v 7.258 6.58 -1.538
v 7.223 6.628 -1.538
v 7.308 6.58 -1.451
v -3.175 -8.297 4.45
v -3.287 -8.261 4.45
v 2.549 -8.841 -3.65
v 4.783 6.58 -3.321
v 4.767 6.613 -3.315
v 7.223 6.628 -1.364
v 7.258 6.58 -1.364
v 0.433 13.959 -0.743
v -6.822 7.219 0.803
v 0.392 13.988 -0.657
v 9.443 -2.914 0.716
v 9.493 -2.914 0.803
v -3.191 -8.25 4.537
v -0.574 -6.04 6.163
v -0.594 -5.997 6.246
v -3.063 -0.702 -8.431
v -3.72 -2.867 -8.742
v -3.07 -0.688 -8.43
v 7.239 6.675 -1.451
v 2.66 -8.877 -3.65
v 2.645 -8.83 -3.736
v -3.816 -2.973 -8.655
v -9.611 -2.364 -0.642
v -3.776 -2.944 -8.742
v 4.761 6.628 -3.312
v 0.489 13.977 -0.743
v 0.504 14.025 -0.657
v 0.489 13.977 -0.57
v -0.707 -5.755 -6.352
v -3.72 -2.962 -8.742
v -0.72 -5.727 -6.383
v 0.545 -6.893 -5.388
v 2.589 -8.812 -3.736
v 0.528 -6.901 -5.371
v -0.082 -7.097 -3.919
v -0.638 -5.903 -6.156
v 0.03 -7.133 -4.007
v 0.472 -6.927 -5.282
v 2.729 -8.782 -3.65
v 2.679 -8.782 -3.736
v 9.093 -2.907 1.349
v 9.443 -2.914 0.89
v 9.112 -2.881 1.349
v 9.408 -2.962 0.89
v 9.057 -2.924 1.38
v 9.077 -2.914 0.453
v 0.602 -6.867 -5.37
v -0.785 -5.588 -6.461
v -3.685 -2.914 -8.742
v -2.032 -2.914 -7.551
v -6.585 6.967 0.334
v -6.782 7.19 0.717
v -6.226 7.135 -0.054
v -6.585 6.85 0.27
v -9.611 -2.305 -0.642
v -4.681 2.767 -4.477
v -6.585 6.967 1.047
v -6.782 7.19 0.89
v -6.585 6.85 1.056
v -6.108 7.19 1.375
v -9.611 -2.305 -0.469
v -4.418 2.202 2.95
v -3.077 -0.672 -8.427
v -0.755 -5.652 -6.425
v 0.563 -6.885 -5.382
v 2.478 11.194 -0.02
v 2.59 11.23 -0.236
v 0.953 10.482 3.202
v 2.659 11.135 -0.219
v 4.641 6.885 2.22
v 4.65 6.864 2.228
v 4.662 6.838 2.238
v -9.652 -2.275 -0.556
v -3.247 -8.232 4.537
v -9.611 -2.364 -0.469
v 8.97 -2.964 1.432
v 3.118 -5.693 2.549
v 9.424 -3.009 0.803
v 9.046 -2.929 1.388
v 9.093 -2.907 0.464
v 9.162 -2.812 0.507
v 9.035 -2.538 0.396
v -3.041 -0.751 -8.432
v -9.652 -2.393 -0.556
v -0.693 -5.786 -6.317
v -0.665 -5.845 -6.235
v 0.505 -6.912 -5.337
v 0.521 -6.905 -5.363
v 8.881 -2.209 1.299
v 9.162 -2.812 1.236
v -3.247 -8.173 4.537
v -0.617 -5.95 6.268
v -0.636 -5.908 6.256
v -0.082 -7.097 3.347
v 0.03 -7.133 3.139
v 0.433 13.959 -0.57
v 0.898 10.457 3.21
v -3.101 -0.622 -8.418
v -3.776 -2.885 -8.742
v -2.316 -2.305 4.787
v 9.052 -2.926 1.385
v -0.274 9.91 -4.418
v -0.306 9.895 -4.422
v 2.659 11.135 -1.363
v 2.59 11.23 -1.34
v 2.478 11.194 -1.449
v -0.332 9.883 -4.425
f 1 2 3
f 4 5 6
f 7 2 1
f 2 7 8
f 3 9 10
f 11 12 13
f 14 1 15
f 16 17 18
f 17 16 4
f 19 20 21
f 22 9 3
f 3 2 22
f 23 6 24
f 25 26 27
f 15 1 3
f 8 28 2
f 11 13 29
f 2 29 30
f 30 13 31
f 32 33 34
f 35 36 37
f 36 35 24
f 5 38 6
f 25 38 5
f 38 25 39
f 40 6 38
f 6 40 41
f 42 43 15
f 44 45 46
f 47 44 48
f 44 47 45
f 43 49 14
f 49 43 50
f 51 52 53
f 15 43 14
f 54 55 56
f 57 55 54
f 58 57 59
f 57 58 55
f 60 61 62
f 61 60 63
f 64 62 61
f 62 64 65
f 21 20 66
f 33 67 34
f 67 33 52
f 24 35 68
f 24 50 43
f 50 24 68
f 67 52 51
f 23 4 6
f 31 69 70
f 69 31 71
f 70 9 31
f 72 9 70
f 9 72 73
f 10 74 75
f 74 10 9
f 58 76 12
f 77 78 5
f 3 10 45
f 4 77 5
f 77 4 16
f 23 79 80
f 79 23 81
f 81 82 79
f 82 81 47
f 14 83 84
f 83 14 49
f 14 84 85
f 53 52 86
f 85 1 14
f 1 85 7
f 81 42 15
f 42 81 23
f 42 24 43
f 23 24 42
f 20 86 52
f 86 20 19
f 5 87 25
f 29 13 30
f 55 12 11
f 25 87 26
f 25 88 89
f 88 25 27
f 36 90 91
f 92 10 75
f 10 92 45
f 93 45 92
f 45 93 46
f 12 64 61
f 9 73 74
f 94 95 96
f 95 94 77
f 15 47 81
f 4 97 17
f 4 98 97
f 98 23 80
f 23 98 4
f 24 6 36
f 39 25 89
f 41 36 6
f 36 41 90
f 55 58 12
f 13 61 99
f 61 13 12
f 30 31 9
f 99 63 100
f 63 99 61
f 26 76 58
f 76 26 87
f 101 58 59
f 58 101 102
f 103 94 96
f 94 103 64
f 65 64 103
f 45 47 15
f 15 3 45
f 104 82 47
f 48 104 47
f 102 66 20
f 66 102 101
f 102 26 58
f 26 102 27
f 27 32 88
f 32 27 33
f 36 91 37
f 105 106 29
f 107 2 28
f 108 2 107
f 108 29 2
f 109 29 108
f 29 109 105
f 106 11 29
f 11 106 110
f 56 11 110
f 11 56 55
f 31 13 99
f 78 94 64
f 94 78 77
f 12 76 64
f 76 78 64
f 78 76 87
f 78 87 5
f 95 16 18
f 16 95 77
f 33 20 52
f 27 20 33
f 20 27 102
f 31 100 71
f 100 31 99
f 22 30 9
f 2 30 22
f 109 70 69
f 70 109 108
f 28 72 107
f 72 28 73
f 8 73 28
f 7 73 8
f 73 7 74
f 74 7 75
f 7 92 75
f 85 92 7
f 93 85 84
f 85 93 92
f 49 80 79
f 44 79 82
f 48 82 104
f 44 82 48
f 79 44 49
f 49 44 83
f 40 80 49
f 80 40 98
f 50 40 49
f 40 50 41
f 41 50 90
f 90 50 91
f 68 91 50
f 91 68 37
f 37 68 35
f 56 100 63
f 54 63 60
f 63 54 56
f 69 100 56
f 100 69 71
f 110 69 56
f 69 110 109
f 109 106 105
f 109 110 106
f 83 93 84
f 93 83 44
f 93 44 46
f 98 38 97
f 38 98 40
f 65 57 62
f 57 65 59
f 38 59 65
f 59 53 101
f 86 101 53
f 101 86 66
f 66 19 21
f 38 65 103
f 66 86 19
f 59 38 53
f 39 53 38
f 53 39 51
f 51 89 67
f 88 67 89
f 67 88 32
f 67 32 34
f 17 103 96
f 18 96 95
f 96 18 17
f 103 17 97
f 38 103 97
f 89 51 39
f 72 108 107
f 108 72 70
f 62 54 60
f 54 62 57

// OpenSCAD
// Auto-generated OpenSCAD file

    inner_points = 10*[[0.2558824559881848, 1.1134809877530691, 0.5000000000030929], [-0.6504210229442514, 0.6908534873760076, 0.50000000000051], [0.9062393061228075, -0.28117666064270774, -9.353628982466944e-13], [-6.41728096287264e-05, -0.7038041610197694, -3.518157987159043e-12], [0.25588245598941933, 1.1134809877565333, -0.49999999999690703], [-0.6504210229430168, 0.6908534873794716, -0.49999999999948996], [0.6578250941889378, 0.2515351583779428, -0.809016994374344], [-0.24847838474349848, -0.17109234199911882, -0.809016994376927], [0.6578250941869402, 0.251535158372338, 0.8090169943755507], [-0.248478384745496, -0.17109234200472362, 0.8090169943729678], [-0.08864545939497245, 0.6692288945346313, -1.3270070091503023]];

    outer_points = 10*[[0.939271150352653, -0.2914253703744584, 0.0802979287858217], [0.35569526368517285, -0.23342057046774728, 0.8902822667134429], [-0.3735213820712076, -0.2914253703744584, -0.865540194553496], [-0.9570972687386876, -0.23342057046774728, -0.05555585662587481], [0.7207978378522963, 0.6580298560378001, -0.14509990785767551], [0.13722195118481623, 0.7160346559445111, 0.6648844300699457], [-0.09055256736269784, 0.6580298560378001, -0.729660015936789], [-0.674128454030178, 0.7160346559445111, 0.08032432199083217], [0.2629446778976564, -0.8782209710934609, -0.36495865525691407], [-0.3206312087698237, -0.8202161711867498, 0.44502568267070713], [0.04731076808846265, 1.3929484844445685, -0.06566580635435994]];

    // Convex hull for inner set (I)
    module inner_hull() {
        hull() {
            for (p = inner_points) {
                translate(p) sphere(r=0.1);
            }
        }
    }

    // Convex hull for outer set (O) minus inner hull (O \ I)
    module outer_minus_inner() {
        difference() {
            hull() {
                for (p = outer_points) {
                    translate(p) sphere(r=0.1);
                }
            }
            inner_hull(); // Subtract inner hull
        }
    }

    // Convex hull for outer set (O) minus all translated inner hulls
    module outer_minus_AllTranslationInner() {
        difference() {
            hull() {
                for (p = outer_points) {
                    translate(p) sphere(r=0.1);
                }
            }
            hull() {
                translate([0,0,50]) inner_hull();
                translate([0,0,-50]) inner_hull();
            }; // Subtract translated inner hulls
        }
    }

    // Difference between outer_minus_inner and outer_minus_AllTranslationInner
    module outer_minus_inner_diff() {
        difference() {
            // Outer minus inner
            difference() {
                hull() {
                    for (p = outer_points) {
                        translate(p) sphere(r=0.1);
                    }
                }
                inner_hull();
            }

            // Subtract Outer minus AllTranslationInner
            difference() {
                hull() {
                    for (p = outer_points) {
                        translate(p) sphere(r=0.1);
                    }
                }
                hull() {
                    translate([0,0,50]) inner_hull();
                    translate([0,0,-50]) inner_hull();
                };
            }
        }
    }

    // Rendering all with colors applied
    color([0, 1, 0, 1]) outer_minus_AllTranslationInner(); // Opaque green
    
